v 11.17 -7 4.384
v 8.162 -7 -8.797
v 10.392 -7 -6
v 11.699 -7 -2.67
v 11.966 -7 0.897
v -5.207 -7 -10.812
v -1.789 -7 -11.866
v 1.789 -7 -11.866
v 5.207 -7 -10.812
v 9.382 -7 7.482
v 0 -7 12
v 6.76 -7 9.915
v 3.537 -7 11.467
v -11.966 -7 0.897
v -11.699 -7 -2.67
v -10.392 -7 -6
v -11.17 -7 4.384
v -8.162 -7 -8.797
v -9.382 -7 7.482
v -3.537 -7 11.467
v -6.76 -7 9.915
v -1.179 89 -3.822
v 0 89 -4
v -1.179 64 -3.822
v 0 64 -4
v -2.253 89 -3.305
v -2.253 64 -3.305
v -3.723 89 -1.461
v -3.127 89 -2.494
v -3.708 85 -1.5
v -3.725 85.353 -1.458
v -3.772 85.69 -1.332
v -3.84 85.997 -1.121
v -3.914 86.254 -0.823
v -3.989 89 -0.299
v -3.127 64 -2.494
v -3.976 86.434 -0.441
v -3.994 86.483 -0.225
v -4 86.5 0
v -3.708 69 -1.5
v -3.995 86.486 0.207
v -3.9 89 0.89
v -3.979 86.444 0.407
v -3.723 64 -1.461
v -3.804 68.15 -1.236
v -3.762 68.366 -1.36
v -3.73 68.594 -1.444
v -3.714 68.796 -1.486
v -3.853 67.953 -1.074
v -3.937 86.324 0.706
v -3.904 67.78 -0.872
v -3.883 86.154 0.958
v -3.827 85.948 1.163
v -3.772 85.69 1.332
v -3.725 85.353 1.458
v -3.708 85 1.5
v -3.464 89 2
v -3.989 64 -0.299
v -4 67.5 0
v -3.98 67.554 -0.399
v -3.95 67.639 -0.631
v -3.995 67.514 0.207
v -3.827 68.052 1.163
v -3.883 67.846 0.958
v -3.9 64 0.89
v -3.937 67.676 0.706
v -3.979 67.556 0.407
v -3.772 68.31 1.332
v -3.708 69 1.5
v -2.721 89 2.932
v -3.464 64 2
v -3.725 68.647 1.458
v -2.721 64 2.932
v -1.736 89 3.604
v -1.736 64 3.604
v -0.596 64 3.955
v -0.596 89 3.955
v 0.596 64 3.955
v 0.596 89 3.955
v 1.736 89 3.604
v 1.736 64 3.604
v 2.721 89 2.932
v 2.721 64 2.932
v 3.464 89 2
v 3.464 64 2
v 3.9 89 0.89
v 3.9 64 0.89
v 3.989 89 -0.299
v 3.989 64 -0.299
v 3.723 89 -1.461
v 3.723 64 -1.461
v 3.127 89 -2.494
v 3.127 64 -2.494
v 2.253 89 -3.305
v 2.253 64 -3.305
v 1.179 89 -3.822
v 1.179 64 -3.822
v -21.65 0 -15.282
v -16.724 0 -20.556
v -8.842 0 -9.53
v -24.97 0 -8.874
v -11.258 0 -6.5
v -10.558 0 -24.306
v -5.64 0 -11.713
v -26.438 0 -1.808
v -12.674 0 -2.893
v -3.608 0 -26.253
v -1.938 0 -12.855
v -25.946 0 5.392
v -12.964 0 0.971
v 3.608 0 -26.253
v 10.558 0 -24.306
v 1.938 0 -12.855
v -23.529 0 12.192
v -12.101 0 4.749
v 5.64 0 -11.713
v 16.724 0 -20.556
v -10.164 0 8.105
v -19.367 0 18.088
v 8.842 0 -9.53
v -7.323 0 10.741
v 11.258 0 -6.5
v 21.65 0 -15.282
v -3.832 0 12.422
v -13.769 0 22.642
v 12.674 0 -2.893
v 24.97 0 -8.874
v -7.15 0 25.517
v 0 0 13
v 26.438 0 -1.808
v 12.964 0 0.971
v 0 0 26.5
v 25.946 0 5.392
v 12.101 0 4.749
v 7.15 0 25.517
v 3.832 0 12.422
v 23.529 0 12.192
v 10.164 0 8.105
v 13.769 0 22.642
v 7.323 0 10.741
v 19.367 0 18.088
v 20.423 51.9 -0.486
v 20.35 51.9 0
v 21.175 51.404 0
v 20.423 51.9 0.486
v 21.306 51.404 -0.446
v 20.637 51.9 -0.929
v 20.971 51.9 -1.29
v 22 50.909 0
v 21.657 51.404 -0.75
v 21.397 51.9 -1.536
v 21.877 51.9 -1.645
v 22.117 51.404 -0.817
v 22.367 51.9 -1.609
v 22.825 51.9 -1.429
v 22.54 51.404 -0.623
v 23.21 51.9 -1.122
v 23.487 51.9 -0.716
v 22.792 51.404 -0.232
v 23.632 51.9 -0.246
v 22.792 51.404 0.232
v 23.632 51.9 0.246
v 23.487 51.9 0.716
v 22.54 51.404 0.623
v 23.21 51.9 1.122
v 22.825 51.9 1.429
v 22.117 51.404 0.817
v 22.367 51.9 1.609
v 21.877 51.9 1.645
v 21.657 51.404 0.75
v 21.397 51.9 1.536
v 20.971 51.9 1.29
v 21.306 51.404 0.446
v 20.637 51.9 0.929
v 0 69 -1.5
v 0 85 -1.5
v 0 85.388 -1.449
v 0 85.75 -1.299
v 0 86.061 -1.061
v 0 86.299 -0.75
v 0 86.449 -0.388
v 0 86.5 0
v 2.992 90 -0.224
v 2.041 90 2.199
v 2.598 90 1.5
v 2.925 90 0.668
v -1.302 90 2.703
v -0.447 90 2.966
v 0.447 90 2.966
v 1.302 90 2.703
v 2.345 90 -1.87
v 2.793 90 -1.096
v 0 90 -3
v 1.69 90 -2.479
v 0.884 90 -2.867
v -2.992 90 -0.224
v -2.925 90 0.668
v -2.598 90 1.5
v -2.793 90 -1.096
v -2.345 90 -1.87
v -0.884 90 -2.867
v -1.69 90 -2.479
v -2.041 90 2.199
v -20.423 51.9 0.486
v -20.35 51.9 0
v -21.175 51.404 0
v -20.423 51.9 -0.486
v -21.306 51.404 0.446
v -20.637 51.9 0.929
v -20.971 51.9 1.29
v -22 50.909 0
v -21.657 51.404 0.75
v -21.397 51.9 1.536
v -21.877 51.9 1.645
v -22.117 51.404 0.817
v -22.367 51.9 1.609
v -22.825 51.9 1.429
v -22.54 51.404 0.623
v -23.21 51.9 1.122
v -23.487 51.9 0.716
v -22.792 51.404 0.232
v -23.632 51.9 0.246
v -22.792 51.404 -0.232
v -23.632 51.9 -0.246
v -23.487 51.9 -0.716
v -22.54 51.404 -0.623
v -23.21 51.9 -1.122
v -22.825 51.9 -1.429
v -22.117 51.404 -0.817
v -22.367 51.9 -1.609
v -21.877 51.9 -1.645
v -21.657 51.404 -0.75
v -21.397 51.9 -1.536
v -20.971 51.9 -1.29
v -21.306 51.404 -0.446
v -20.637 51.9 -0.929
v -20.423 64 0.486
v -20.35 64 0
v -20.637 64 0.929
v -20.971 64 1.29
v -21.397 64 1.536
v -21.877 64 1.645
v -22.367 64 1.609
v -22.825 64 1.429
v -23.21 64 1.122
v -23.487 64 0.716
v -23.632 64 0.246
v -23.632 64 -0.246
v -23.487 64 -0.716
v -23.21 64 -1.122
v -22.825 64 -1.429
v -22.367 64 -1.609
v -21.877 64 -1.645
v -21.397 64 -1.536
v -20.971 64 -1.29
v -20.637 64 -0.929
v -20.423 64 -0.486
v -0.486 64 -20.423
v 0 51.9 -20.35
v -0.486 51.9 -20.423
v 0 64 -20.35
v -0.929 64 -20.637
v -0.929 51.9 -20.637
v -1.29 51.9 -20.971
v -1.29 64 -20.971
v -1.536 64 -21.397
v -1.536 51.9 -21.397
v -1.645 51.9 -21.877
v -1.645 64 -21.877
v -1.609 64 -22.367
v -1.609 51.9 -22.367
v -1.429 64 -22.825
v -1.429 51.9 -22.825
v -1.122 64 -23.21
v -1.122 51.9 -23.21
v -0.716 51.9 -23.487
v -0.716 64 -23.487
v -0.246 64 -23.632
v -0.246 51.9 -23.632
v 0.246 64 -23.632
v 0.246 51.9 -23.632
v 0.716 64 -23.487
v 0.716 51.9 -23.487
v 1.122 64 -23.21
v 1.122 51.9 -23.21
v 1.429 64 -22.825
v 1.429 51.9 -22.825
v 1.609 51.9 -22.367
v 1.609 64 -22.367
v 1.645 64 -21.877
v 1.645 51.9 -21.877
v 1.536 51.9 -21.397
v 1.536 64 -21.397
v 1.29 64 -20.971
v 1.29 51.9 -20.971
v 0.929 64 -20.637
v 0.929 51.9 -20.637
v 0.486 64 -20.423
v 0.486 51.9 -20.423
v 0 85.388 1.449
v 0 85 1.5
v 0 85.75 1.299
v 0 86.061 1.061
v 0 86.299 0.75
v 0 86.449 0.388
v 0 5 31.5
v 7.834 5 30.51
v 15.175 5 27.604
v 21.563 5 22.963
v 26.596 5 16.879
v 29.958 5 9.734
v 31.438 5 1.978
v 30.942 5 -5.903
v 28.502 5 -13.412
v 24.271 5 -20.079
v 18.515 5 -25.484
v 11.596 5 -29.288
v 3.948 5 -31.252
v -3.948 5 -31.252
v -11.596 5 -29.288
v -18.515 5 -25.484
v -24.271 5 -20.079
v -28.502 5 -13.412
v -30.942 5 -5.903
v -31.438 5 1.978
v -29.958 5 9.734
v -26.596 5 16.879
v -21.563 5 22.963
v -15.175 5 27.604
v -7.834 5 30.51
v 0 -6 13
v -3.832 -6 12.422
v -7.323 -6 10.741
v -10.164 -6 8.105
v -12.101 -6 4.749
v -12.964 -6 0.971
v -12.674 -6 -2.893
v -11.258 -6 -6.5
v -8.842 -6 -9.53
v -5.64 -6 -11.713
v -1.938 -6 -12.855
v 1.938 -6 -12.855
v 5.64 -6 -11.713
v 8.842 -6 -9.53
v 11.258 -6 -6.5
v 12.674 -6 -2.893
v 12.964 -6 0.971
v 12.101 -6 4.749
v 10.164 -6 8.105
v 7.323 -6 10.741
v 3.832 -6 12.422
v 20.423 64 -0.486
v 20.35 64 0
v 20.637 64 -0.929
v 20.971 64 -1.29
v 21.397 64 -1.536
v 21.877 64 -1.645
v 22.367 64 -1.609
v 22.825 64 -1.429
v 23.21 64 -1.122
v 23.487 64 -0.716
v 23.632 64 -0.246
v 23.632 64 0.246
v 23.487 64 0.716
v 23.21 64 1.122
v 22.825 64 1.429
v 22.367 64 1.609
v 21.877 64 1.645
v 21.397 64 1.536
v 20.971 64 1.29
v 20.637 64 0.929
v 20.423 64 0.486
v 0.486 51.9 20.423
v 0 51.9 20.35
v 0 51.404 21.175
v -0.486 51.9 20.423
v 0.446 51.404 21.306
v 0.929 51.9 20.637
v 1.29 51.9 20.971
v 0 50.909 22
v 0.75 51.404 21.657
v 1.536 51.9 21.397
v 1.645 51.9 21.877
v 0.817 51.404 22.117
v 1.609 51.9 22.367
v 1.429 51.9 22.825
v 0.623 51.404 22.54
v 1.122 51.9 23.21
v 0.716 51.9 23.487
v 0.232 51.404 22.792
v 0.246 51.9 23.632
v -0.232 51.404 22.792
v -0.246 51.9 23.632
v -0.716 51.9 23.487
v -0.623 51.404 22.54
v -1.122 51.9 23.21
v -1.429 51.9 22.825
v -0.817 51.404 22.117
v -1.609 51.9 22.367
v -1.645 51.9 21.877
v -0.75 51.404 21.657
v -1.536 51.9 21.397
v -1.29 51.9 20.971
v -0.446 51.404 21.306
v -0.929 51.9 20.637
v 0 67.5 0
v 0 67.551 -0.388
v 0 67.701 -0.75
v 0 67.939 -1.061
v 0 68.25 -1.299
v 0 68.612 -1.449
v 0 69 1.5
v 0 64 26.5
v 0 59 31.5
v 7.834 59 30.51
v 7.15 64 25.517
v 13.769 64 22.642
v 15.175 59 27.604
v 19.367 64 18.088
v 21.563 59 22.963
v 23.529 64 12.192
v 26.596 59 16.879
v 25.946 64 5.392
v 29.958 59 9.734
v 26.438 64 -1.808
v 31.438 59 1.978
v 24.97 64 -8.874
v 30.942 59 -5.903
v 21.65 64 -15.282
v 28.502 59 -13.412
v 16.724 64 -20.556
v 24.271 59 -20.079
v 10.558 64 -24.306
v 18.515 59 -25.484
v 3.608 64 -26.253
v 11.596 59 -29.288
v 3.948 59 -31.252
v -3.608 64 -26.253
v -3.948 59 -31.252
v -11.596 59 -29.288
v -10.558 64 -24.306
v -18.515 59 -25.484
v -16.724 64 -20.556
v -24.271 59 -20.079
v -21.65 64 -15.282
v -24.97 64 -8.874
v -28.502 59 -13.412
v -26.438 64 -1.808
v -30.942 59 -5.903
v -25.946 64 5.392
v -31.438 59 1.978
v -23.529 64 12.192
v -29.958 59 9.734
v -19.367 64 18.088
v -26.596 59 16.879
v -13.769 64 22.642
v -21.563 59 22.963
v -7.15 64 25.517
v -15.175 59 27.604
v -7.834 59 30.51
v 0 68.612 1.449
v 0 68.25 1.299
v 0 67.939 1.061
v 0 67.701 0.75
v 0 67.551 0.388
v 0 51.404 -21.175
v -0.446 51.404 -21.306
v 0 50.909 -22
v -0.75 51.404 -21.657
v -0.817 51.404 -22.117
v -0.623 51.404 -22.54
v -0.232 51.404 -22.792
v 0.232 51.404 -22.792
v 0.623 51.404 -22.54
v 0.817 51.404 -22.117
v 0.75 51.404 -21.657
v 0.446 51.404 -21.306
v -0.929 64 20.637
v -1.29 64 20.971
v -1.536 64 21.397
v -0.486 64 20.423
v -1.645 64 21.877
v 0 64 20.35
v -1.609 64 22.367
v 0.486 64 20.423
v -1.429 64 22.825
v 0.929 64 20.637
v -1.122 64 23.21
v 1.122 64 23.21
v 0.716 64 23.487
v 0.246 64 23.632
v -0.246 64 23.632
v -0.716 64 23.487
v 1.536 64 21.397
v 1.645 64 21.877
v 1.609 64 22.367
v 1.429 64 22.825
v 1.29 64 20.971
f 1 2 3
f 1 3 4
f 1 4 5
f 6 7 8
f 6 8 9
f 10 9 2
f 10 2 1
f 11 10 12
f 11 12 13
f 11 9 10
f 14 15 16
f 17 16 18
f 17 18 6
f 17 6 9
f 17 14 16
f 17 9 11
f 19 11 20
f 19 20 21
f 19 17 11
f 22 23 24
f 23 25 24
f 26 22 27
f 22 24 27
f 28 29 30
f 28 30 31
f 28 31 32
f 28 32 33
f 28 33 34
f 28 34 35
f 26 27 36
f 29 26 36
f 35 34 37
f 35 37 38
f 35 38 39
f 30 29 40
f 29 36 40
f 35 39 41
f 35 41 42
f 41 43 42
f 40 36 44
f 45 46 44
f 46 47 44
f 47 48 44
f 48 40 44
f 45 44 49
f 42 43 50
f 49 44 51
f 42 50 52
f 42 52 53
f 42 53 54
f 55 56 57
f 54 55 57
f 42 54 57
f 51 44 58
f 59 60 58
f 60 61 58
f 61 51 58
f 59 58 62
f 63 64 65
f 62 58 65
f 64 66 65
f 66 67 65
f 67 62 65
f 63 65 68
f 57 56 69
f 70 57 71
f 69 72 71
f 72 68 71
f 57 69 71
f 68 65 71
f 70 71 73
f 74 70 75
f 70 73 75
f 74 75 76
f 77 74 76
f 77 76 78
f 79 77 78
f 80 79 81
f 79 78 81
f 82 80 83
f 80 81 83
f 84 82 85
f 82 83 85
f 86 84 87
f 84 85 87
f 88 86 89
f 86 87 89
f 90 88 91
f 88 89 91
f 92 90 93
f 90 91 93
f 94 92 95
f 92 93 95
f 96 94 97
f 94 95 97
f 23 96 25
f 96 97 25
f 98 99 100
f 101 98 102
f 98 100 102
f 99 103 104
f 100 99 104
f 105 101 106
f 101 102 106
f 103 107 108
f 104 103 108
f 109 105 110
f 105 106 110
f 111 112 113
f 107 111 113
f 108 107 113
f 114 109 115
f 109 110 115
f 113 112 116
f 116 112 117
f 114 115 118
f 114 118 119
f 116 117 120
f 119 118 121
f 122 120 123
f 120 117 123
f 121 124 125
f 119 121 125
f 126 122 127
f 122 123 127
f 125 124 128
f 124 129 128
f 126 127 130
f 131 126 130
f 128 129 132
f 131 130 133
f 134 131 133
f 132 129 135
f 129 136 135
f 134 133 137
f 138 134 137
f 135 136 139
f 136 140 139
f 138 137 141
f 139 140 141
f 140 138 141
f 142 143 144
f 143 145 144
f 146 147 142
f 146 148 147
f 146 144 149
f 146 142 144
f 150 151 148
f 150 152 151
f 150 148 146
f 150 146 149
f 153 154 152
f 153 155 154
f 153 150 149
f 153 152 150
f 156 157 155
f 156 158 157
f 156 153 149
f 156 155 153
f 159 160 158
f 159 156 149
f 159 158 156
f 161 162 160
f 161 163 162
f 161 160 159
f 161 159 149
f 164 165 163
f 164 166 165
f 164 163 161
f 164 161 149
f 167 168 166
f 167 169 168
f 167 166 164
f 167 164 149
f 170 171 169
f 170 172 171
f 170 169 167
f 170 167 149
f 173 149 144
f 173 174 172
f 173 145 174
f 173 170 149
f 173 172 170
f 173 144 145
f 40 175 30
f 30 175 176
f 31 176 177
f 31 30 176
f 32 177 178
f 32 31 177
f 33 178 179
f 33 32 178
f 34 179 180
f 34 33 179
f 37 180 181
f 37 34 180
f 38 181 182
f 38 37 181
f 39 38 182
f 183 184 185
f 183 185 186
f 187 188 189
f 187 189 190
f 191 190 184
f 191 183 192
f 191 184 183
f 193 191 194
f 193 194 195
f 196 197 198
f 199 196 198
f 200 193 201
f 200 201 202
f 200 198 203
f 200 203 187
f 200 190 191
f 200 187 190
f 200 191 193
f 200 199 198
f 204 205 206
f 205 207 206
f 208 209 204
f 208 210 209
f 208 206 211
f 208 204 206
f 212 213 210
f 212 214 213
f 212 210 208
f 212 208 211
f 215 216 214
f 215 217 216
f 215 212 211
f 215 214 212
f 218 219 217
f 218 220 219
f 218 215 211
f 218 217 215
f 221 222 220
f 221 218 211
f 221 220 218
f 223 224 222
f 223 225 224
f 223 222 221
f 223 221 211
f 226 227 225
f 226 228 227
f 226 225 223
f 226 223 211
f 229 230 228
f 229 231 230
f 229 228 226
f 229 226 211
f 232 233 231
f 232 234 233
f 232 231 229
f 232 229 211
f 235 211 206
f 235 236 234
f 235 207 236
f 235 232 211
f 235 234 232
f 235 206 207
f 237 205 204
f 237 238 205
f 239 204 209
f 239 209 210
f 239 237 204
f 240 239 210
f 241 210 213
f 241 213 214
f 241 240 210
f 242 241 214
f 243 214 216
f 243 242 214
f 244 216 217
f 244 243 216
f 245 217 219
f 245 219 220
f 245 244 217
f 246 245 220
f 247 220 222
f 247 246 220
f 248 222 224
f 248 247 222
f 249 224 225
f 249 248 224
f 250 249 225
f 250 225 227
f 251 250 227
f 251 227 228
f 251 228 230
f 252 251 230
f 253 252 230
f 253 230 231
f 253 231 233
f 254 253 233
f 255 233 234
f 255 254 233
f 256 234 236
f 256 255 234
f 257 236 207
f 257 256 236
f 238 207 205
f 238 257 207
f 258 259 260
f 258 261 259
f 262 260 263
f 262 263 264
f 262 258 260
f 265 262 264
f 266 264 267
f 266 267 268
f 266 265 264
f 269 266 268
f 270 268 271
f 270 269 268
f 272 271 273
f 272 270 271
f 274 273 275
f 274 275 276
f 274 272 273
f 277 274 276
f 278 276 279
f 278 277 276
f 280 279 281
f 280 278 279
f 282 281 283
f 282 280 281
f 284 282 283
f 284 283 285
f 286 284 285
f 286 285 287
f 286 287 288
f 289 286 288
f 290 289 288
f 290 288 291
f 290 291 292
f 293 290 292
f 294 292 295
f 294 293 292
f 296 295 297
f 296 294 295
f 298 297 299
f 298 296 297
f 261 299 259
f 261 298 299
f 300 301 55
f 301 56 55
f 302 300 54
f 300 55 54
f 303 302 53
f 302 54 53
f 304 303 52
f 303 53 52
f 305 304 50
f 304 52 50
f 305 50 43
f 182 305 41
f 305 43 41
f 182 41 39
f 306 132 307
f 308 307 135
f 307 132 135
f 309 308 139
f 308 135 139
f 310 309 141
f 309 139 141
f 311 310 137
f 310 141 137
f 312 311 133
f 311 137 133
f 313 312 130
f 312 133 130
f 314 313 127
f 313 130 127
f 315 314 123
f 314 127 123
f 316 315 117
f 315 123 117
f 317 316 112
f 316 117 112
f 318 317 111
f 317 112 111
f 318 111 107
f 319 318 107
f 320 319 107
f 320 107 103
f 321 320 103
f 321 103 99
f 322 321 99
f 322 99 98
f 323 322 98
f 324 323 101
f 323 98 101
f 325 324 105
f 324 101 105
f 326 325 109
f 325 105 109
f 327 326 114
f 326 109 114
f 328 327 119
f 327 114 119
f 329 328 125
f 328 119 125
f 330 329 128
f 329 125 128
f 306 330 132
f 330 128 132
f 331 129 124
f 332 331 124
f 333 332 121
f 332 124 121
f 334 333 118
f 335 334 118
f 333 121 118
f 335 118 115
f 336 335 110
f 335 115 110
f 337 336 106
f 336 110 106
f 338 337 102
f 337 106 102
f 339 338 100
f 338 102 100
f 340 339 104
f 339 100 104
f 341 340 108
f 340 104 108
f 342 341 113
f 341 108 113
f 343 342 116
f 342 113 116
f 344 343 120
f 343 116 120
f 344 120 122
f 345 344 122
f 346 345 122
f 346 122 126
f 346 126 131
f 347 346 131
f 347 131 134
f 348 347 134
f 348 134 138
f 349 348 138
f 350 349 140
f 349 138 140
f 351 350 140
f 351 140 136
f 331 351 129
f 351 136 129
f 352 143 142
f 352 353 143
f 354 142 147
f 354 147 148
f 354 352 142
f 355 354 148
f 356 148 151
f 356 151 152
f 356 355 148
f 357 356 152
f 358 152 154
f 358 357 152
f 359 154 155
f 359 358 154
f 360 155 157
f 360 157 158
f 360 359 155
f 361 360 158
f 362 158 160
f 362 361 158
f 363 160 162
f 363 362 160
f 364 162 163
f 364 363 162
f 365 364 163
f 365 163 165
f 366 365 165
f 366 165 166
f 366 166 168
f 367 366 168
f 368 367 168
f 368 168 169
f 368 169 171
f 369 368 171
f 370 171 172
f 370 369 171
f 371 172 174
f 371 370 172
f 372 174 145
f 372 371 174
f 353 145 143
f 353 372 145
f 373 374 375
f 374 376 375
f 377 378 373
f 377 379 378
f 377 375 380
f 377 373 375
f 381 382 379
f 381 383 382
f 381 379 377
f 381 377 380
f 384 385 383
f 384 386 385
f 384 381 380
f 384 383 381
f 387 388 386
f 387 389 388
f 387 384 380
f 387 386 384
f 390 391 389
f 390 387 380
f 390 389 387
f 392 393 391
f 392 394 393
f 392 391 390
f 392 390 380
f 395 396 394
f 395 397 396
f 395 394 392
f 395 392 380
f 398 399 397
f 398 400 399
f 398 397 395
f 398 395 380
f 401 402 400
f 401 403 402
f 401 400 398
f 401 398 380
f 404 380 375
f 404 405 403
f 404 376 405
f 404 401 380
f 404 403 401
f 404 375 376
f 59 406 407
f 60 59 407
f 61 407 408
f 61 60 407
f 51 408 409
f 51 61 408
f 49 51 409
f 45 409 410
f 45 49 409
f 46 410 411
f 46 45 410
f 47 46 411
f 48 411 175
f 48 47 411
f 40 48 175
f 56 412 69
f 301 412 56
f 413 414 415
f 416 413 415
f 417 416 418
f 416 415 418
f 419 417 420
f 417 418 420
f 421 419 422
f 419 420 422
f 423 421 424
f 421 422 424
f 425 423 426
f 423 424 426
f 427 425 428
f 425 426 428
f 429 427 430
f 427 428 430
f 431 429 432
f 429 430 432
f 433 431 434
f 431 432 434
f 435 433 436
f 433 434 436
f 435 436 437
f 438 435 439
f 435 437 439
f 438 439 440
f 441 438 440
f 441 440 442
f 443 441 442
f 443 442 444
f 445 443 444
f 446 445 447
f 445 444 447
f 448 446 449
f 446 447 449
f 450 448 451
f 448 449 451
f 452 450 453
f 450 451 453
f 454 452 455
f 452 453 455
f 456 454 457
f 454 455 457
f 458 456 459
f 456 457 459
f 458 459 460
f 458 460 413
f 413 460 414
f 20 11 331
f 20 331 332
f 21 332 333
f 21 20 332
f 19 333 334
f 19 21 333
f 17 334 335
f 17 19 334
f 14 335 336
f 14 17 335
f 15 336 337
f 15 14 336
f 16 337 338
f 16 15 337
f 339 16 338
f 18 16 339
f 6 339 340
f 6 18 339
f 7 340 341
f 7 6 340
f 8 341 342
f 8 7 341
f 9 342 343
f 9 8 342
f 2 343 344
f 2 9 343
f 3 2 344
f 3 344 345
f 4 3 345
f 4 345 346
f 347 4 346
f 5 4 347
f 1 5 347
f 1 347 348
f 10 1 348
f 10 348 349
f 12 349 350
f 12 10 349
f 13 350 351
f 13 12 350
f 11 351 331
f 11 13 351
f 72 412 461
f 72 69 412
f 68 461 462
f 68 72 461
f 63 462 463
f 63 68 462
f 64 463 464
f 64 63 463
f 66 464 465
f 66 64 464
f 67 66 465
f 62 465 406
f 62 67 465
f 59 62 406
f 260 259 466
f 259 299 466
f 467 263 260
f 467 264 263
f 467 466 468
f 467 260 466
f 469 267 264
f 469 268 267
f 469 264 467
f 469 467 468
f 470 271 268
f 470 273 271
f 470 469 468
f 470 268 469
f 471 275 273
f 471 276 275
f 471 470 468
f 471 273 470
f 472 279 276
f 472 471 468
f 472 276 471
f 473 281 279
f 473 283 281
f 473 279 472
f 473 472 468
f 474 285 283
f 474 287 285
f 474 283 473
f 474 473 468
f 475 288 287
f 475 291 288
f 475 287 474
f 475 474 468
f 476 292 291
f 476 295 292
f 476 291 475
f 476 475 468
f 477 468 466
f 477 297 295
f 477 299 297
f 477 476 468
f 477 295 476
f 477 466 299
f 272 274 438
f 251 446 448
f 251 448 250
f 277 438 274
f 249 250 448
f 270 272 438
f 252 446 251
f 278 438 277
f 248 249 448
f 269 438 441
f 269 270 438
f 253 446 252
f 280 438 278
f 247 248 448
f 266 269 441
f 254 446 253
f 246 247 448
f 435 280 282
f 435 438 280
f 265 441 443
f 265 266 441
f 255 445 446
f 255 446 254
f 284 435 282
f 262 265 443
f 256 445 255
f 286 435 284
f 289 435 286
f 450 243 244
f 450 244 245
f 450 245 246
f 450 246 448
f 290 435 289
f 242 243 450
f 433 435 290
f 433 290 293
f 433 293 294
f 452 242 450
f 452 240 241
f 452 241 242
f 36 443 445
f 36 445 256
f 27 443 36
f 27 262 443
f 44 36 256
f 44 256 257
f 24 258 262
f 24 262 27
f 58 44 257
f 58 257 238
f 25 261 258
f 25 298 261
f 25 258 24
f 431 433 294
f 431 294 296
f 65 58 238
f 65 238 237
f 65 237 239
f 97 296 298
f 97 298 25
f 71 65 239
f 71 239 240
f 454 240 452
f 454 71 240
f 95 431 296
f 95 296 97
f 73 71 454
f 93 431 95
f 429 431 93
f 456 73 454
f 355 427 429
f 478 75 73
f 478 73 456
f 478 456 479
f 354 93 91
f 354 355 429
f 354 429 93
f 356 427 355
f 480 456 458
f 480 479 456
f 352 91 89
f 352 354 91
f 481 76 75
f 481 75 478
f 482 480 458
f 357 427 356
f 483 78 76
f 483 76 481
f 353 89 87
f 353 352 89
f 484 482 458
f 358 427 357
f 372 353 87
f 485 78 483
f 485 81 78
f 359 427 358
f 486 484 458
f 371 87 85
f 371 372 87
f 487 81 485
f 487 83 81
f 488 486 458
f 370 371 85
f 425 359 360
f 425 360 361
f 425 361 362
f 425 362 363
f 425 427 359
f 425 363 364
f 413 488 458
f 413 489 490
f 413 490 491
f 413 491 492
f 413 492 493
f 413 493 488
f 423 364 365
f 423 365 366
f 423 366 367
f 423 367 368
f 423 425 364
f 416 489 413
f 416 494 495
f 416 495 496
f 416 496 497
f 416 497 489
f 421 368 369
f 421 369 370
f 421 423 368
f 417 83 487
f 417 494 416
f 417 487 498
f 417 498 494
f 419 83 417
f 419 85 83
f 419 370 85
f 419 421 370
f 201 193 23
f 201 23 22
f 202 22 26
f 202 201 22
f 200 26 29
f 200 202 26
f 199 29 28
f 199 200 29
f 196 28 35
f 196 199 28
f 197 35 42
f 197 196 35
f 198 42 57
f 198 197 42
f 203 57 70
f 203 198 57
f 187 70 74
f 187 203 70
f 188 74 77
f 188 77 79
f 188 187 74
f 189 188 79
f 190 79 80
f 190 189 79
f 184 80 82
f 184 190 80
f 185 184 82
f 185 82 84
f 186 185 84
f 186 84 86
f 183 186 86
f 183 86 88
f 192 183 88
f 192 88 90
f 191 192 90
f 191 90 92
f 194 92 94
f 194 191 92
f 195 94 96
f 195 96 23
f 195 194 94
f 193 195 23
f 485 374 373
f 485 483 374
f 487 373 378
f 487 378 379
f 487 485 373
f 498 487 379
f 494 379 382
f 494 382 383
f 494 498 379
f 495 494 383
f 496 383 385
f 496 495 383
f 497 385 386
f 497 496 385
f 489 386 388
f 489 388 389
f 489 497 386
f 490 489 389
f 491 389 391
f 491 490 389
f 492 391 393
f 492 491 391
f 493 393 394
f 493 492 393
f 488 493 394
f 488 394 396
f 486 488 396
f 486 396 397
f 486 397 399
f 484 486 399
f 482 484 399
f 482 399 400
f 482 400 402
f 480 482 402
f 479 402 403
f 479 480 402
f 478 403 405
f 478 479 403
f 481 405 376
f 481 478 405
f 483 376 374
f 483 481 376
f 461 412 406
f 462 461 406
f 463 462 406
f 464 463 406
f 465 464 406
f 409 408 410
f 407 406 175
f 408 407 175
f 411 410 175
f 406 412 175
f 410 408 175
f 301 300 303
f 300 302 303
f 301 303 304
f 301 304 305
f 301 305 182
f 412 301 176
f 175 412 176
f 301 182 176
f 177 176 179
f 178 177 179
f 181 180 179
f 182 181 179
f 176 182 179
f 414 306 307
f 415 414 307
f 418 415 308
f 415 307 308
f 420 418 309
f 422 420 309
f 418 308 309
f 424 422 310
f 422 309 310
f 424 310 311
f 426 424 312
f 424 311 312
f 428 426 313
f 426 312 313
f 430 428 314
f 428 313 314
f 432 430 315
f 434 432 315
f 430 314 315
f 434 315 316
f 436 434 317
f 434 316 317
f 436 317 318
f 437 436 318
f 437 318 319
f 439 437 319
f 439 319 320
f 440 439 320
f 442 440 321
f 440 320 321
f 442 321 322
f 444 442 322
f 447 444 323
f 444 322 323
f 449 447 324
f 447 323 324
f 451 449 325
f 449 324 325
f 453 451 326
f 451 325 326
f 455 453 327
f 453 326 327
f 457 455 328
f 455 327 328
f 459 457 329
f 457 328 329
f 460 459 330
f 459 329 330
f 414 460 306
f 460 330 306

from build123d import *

# Parameters (mm, degrees)
SKETCH1_R               = 31.5
BOSS_EXTRUDE1_DEPTH     = 64
SKETCH2_R               = 4
BOSS_EXTRUDE2_DEPTH     = 26
CHAMFER3_SIZE           = 1
CUT_EXTRUDE1_REACH      = 102.422
CUT_EXTRUDE1_END_RADIUS = 4
SKETCH3_W               = 3
SKETCH3_H               = 19
FILLET1_R               = 1.5
CIRPATTERN2_COUNT       = 4
CHAMFER4_SIZE           = 5
SKETCH11_R              = 13
BOSS_EXTRUDE3_DEPTH     = 7
CHAMFER5_SIZE           = 1


with BuildPart() as part:
    # Sketch1 → Boss-Extrude1 (new body)
    with BuildSketch(Plane(origin=(0, 0, 0), x_dir=(1, 0, 0), z_dir=(0, 1, 0))):
        with Locations(Location((0, 0, 0), (0, 0, 270))):
            Circle(SKETCH1_R)
    extrude(amount=BOSS_EXTRUDE1_DEPTH)

    # Sketch2 → Boss-Extrude2 (add)
    with BuildSketch(Plane(origin=(0, 64, 0), x_dir=(1, 0, 0), z_dir=(0, 1, 0))):
        with Locations(Location((0, 0, 0), (0, 0, 90))):
            Circle(SKETCH2_R)
    extrude(amount=BOSS_EXTRUDE2_DEPTH)

    # Chamfer3
    chamfer3_edges = [part.edges().sort_by_distance(p)[0] for p in [
        (0, 90, 4),
    ]]
    chamfer(chamfer3_edges, length=CHAMFER3_SIZE)

    # Cut-Extrude1: up to this cylinder (the profile starts inside it)
    cut_extrude1_end = Plane(origin=(0, 77, 0), z_dir=(0, -1, 0)) * Cylinder(CUT_EXTRUDE1_END_RADIUS, 213.844, mode=Mode.PRIVATE)
    # Sketch3 → Cut-Extrude1 (cut, up to the surface)
    with BuildSketch(Plane(origin=(0, 0, 0), x_dir=(0, 0, -1), z_dir=(1, 0, 0)), mode=Mode.PRIVATE) as cut_extrude1_sk1:
        with Locations((0, 77)):
            Rectangle(SKETCH3_W, SKETCH3_H)
    cut_extrude1_tool1 = extrude(cut_extrude1_sk1.sketch, amount=-CUT_EXTRUDE1_REACH, mode=Mode.PRIVATE) & cut_extrude1_end
    add(cut_extrude1_tool1.solids().sort_by_distance((0, 77, 0))[0], mode=Mode.SUBTRACT)

    # Fillet1
    fillet1_edges = [part.edges().sort_by_distance(p)[0] for p in [
        (-1.854049622, 67.5, -1.5),
        (-1.854049622, 67.5, 1.5),
        (-1.854049622, 86.5, -1.5),
        (-1.854049622, 86.5, 1.5),
    ]]
    fillet(fillet1_edges, radius=FILLET1_R - 0.0001)  # a hair under: the kernel refuses the full size

    # Sketch10 → M4 Tapped Hole1 (revolve, cut)
    with BuildSketch(Plane(origin=(0, 64, -22), x_dir=(0, 0, 1), z_dir=(1, 0, 0))):
        Polygon((0, 0), (0, 13.091420021), (1.65, 12.1), (1.65, 0), align=None)
    m4_tapped_hole1 = revolve(axis=Axis((0, 70.35, -22), (0, -1, 0)), mode=Mode.SUBTRACT)

    # CirPattern2: M4 Tapped Hole1 ×4 about axis
    cirpattern2_axis = Axis((0, 0, 0), (0, 1, 0))
    for i in range(1, CIRPATTERN2_COUNT):
        add(m4_tapped_hole1.rotate(cirpattern2_axis, i * 360 / CIRPATTERN2_COUNT), mode=Mode.SUBTRACT)

    # Chamfer4
    chamfer4_edges = [part.edges().sort_by_distance(p)[0] for p in [
        (0, 0, -31.5),
        (0, 64, -31.5),
    ]]
    chamfer(chamfer4_edges, length=CHAMFER4_SIZE)

    # Sketch11 → Boss-Extrude3 (add)
    with BuildSketch(Plane(origin=(0, 0, 0), x_dir=(-1, 0, 0), z_dir=(0, -1, 0))):
        with Locations(Location((0, 0, 0), (0, 0, 270))):
            Circle(SKETCH11_R)
    extrude(amount=BOSS_EXTRUDE3_DEPTH)

    # Chamfer5
    chamfer5_edges = [part.edges().sort_by_distance(p)[0] for p in [
        (0, -7, -13),
    ]]
    chamfer(chamfer5_edges, length=CHAMFER5_SIZE)


solid = part.part
